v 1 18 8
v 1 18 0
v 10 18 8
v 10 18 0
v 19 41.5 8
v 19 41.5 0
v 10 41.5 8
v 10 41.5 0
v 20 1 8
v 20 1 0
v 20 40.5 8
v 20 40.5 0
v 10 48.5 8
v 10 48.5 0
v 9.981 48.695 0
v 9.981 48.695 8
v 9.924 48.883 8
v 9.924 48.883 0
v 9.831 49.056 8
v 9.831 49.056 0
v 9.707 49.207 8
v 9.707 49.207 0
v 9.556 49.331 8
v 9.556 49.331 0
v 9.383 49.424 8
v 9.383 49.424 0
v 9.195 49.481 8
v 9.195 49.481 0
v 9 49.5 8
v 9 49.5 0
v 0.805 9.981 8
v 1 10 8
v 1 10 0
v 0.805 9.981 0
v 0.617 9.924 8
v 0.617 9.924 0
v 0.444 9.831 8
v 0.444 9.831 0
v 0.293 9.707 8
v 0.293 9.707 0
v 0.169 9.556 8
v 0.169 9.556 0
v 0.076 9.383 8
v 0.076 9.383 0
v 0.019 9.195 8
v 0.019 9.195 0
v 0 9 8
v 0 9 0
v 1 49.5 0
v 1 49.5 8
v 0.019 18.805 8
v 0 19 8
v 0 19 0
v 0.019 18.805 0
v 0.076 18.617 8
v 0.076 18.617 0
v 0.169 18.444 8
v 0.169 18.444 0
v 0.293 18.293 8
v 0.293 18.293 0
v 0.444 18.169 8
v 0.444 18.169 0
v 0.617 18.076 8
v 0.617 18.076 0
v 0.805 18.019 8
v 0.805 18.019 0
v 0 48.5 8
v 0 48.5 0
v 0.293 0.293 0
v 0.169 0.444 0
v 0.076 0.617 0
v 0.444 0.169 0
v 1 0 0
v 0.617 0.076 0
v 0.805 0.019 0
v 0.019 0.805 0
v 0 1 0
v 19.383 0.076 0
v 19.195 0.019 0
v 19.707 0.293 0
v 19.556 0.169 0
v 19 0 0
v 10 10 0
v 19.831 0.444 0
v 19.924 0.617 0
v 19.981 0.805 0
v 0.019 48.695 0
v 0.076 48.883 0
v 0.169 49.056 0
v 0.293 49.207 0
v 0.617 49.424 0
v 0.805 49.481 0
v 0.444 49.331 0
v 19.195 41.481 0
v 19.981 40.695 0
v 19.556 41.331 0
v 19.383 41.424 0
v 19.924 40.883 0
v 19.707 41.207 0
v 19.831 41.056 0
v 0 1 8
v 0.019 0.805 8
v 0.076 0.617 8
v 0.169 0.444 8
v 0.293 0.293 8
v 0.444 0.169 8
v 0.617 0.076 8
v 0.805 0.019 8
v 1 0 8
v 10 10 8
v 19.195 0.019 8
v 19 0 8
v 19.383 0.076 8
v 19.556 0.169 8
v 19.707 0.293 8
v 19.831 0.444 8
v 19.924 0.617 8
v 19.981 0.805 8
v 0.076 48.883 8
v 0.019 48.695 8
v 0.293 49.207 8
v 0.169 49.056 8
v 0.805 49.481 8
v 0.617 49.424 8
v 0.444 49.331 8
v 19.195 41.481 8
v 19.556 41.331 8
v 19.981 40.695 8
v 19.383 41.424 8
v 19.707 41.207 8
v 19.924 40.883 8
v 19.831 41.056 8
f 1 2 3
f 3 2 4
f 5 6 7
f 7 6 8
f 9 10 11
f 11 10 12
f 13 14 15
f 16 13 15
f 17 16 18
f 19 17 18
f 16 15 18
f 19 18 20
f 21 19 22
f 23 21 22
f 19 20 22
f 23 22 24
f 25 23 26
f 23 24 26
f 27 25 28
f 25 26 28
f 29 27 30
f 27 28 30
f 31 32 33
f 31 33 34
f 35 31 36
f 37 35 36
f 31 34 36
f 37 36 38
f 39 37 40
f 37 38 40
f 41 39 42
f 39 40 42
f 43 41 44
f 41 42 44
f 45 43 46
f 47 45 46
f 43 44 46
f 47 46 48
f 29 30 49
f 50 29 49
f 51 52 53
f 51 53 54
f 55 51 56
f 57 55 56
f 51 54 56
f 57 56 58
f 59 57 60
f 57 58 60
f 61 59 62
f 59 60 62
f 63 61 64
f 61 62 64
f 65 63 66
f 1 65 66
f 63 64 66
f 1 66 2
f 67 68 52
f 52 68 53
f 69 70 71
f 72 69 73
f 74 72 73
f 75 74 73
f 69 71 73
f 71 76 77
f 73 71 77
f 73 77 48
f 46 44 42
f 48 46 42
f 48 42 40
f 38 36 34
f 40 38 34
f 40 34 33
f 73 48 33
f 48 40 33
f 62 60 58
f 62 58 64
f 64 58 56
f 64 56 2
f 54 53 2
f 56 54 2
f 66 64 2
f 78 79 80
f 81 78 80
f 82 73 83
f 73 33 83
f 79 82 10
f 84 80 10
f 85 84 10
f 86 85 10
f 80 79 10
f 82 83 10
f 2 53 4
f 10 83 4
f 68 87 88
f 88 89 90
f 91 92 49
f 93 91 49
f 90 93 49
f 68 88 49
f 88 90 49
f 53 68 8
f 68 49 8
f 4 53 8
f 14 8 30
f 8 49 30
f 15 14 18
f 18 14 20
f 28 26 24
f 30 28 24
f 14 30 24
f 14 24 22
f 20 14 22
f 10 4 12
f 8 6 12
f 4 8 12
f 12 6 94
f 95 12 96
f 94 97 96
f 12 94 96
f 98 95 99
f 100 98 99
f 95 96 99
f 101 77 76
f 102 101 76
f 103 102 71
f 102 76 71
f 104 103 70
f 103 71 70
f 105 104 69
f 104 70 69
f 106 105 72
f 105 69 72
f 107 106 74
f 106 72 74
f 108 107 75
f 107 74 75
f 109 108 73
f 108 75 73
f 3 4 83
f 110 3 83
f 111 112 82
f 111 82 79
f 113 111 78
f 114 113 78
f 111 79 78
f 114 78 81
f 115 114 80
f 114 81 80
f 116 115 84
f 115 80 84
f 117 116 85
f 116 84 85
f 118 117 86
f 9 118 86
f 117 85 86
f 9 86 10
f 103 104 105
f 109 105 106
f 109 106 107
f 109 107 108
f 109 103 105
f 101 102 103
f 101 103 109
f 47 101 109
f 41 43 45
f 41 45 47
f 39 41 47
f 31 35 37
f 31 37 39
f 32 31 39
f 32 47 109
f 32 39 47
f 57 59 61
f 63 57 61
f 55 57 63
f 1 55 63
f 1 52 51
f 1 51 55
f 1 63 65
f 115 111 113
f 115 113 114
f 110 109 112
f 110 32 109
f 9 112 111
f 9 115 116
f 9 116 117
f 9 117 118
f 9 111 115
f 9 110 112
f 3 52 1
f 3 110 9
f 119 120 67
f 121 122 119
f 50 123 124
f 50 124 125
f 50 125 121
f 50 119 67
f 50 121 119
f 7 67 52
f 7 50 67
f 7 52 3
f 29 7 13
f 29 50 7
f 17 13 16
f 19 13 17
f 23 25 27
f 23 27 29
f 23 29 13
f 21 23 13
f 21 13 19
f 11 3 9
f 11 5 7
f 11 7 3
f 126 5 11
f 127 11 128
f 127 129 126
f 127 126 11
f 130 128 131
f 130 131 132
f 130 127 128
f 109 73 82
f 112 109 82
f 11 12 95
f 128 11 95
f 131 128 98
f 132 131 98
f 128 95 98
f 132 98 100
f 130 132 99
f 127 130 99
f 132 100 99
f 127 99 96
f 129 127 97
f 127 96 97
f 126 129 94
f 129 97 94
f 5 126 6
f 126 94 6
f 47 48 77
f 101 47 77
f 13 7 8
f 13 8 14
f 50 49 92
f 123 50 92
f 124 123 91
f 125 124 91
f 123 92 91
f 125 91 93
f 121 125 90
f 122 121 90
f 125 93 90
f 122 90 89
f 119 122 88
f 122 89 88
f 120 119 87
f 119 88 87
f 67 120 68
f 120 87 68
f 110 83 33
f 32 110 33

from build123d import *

# Parameters (mm, degrees)
BOSS_EXTRUDE1_DEPTH = 8


with BuildPart() as part:
    # Sketch1 → Boss-Extrude1 (new body)
    with BuildSketch(Plane.XY):
        with BuildLine():
            Line((1, 0), (19, 0))
            ThreePointArc((19, 0), (19.707106781, 0.292893219), (20, 1))
            Line((20, 1), (20, 40.5))
            ThreePointArc((20, 40.5), (19.707106781, 41.207106781), (19, 41.5))
            Line((19, 41.5), (10, 41.5))
            Line((10, 41.5), (10, 48.5))
            ThreePointArc((10, 48.5), (9.707106781, 49.207106781), (9, 49.5))
            Line((9, 49.5), (1, 49.5))
            ThreePointArc((1, 49.5), (0.292893219, 49.207106781), (0, 48.5))
            Line((0, 48.5), (0, 19))
            ThreePointArc((0, 19), (0.292893219, 18.292893219), (1, 18))
            Line((1, 18), (10, 18))
            Line((10, 18), (10, 10))
            Line((10, 10), (1, 10))
            ThreePointArc((1, 10), (0.292893219, 9.707106781), (0, 9))
            Line((0, 9), (0, 1))
            ThreePointArc((0, 1), (0.292893219, 0.292893219), (1, 0))
        make_face()
    extrude(amount=BOSS_EXTRUDE1_DEPTH)


solid = part.part
